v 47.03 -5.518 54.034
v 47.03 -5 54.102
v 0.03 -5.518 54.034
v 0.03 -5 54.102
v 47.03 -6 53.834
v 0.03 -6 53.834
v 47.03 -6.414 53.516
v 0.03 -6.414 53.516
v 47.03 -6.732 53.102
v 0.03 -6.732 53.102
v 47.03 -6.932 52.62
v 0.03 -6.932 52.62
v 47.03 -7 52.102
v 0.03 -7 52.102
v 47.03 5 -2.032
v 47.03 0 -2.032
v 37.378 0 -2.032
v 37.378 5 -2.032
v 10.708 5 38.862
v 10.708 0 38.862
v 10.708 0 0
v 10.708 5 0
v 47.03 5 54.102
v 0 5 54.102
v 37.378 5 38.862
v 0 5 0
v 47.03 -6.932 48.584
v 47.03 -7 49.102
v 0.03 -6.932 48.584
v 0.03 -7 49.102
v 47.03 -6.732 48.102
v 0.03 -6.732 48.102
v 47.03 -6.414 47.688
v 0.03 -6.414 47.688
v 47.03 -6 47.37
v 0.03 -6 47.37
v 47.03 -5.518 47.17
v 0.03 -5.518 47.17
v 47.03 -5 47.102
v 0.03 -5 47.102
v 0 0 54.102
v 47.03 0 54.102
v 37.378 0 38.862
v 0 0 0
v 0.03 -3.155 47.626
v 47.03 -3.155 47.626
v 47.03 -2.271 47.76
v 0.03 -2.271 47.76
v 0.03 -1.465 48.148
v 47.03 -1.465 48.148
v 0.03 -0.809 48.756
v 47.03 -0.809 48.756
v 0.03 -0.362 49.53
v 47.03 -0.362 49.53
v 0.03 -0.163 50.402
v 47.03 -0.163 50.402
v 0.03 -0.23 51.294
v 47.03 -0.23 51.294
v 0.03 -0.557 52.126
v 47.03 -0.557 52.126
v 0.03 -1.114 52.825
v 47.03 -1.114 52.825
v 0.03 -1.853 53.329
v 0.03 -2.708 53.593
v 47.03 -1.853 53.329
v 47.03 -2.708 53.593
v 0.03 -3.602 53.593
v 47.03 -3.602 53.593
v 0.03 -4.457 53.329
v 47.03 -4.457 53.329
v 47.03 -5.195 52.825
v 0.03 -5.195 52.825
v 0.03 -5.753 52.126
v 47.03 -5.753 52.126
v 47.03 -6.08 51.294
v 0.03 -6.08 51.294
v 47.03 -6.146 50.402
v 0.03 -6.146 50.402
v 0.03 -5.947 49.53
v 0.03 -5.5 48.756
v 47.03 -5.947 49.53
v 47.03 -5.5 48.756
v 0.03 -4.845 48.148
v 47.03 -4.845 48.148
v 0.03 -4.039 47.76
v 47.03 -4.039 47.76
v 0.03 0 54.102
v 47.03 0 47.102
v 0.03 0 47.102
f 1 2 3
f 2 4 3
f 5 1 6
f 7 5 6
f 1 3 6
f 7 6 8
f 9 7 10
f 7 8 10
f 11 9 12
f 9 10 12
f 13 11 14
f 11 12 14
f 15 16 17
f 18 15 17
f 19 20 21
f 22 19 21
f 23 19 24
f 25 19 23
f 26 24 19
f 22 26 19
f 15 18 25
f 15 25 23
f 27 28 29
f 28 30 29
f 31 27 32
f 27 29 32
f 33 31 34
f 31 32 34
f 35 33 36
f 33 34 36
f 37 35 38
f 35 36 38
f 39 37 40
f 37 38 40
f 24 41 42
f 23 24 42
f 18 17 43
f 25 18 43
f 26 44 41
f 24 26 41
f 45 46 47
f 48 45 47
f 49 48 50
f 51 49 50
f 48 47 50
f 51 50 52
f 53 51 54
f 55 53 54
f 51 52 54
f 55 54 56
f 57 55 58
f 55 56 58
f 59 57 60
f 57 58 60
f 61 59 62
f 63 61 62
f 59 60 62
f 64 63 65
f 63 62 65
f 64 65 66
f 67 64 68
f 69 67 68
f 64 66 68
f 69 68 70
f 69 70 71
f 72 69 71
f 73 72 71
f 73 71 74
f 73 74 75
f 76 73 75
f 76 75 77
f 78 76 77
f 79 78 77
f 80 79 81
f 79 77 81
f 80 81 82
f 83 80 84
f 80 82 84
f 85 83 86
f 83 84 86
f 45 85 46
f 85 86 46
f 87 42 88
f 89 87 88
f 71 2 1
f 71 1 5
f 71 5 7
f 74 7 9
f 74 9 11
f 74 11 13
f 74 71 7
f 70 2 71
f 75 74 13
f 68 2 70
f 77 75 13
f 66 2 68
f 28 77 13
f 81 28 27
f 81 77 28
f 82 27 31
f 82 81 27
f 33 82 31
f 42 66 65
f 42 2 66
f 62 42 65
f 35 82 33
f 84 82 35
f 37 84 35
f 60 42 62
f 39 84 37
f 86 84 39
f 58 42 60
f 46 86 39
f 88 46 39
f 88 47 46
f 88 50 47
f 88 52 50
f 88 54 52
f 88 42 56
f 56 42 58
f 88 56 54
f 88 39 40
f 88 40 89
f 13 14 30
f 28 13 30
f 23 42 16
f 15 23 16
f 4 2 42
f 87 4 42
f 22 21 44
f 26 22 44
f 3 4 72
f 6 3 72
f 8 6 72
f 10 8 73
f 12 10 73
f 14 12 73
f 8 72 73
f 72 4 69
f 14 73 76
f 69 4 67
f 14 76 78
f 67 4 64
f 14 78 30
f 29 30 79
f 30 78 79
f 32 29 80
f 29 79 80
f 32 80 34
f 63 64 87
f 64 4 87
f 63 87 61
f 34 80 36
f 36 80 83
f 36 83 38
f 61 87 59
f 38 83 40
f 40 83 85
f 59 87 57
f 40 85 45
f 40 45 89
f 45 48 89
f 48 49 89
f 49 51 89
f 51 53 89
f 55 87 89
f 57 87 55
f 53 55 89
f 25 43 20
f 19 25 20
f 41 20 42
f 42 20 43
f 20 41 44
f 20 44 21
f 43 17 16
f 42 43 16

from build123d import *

# Parameters (mm, degrees)
BOSS_EXTRUDE1_DEPTH = 5
SKETCH2_W           = 7
SKETCH2_H           = 7
BOSS_EXTRUDE2_DEPTH = 47
SKETCH5_R           = 3
CUT_EXTRUDE1_DEPTH  = 47
FILLET2_R           = 2


with BuildPart() as part:
    # Sketch1 → Boss-Extrude1 (new body)
    with BuildSketch(Plane(origin=(0, 0, 0), x_dir=(1, 0, 0), z_dir=(0, 1, 0))):
        Polygon((0, 0), (0, -54.102), (47.029678449, -54.102), (47.029678449, 2.032), (37.377678449, 2.032), (37.377678449, -38.862), (10.707678449, -38.862), (10.707678449, 0), align=None)
    extrude(amount=BOSS_EXTRUDE1_DEPTH)


with BuildPart() as body_2:
    # Sketch2 → Boss-Extrude2 (new body)
    with BuildSketch(Plane(origin=(47.029678449, 0, 0), x_dir=(0, 0, -1), z_dir=(1, 0, 0))):
        with Locations((-50.602, -3.5)):
            Rectangle(SKETCH2_W, SKETCH2_H)
    extrude(amount=-BOSS_EXTRUDE2_DEPTH)

    # Sketch5 → Cut-Extrude1 (cut)
    with BuildSketch(Plane(origin=(47.029678449, 0, 0), x_dir=(0, 0, -1), z_dir=(1, 0, 0))):
        with Locations((-50.626343161, -3.154860788)):
            Circle(SKETCH5_R)
    extrude(amount=-CUT_EXTRUDE1_DEPTH, mode=Mode.SUBTRACT)

    # Fillet2
    fillet2_edges = [body_2.edges().sort_by_distance(p)[0] for p in [
        (23.529678449, -7, 47.102),
        (23.529678449, -7, 54.102),
    ]]
    fillet(fillet2_edges, radius=FILLET2_R)


solid = Compound([part.part, body_2.part])
